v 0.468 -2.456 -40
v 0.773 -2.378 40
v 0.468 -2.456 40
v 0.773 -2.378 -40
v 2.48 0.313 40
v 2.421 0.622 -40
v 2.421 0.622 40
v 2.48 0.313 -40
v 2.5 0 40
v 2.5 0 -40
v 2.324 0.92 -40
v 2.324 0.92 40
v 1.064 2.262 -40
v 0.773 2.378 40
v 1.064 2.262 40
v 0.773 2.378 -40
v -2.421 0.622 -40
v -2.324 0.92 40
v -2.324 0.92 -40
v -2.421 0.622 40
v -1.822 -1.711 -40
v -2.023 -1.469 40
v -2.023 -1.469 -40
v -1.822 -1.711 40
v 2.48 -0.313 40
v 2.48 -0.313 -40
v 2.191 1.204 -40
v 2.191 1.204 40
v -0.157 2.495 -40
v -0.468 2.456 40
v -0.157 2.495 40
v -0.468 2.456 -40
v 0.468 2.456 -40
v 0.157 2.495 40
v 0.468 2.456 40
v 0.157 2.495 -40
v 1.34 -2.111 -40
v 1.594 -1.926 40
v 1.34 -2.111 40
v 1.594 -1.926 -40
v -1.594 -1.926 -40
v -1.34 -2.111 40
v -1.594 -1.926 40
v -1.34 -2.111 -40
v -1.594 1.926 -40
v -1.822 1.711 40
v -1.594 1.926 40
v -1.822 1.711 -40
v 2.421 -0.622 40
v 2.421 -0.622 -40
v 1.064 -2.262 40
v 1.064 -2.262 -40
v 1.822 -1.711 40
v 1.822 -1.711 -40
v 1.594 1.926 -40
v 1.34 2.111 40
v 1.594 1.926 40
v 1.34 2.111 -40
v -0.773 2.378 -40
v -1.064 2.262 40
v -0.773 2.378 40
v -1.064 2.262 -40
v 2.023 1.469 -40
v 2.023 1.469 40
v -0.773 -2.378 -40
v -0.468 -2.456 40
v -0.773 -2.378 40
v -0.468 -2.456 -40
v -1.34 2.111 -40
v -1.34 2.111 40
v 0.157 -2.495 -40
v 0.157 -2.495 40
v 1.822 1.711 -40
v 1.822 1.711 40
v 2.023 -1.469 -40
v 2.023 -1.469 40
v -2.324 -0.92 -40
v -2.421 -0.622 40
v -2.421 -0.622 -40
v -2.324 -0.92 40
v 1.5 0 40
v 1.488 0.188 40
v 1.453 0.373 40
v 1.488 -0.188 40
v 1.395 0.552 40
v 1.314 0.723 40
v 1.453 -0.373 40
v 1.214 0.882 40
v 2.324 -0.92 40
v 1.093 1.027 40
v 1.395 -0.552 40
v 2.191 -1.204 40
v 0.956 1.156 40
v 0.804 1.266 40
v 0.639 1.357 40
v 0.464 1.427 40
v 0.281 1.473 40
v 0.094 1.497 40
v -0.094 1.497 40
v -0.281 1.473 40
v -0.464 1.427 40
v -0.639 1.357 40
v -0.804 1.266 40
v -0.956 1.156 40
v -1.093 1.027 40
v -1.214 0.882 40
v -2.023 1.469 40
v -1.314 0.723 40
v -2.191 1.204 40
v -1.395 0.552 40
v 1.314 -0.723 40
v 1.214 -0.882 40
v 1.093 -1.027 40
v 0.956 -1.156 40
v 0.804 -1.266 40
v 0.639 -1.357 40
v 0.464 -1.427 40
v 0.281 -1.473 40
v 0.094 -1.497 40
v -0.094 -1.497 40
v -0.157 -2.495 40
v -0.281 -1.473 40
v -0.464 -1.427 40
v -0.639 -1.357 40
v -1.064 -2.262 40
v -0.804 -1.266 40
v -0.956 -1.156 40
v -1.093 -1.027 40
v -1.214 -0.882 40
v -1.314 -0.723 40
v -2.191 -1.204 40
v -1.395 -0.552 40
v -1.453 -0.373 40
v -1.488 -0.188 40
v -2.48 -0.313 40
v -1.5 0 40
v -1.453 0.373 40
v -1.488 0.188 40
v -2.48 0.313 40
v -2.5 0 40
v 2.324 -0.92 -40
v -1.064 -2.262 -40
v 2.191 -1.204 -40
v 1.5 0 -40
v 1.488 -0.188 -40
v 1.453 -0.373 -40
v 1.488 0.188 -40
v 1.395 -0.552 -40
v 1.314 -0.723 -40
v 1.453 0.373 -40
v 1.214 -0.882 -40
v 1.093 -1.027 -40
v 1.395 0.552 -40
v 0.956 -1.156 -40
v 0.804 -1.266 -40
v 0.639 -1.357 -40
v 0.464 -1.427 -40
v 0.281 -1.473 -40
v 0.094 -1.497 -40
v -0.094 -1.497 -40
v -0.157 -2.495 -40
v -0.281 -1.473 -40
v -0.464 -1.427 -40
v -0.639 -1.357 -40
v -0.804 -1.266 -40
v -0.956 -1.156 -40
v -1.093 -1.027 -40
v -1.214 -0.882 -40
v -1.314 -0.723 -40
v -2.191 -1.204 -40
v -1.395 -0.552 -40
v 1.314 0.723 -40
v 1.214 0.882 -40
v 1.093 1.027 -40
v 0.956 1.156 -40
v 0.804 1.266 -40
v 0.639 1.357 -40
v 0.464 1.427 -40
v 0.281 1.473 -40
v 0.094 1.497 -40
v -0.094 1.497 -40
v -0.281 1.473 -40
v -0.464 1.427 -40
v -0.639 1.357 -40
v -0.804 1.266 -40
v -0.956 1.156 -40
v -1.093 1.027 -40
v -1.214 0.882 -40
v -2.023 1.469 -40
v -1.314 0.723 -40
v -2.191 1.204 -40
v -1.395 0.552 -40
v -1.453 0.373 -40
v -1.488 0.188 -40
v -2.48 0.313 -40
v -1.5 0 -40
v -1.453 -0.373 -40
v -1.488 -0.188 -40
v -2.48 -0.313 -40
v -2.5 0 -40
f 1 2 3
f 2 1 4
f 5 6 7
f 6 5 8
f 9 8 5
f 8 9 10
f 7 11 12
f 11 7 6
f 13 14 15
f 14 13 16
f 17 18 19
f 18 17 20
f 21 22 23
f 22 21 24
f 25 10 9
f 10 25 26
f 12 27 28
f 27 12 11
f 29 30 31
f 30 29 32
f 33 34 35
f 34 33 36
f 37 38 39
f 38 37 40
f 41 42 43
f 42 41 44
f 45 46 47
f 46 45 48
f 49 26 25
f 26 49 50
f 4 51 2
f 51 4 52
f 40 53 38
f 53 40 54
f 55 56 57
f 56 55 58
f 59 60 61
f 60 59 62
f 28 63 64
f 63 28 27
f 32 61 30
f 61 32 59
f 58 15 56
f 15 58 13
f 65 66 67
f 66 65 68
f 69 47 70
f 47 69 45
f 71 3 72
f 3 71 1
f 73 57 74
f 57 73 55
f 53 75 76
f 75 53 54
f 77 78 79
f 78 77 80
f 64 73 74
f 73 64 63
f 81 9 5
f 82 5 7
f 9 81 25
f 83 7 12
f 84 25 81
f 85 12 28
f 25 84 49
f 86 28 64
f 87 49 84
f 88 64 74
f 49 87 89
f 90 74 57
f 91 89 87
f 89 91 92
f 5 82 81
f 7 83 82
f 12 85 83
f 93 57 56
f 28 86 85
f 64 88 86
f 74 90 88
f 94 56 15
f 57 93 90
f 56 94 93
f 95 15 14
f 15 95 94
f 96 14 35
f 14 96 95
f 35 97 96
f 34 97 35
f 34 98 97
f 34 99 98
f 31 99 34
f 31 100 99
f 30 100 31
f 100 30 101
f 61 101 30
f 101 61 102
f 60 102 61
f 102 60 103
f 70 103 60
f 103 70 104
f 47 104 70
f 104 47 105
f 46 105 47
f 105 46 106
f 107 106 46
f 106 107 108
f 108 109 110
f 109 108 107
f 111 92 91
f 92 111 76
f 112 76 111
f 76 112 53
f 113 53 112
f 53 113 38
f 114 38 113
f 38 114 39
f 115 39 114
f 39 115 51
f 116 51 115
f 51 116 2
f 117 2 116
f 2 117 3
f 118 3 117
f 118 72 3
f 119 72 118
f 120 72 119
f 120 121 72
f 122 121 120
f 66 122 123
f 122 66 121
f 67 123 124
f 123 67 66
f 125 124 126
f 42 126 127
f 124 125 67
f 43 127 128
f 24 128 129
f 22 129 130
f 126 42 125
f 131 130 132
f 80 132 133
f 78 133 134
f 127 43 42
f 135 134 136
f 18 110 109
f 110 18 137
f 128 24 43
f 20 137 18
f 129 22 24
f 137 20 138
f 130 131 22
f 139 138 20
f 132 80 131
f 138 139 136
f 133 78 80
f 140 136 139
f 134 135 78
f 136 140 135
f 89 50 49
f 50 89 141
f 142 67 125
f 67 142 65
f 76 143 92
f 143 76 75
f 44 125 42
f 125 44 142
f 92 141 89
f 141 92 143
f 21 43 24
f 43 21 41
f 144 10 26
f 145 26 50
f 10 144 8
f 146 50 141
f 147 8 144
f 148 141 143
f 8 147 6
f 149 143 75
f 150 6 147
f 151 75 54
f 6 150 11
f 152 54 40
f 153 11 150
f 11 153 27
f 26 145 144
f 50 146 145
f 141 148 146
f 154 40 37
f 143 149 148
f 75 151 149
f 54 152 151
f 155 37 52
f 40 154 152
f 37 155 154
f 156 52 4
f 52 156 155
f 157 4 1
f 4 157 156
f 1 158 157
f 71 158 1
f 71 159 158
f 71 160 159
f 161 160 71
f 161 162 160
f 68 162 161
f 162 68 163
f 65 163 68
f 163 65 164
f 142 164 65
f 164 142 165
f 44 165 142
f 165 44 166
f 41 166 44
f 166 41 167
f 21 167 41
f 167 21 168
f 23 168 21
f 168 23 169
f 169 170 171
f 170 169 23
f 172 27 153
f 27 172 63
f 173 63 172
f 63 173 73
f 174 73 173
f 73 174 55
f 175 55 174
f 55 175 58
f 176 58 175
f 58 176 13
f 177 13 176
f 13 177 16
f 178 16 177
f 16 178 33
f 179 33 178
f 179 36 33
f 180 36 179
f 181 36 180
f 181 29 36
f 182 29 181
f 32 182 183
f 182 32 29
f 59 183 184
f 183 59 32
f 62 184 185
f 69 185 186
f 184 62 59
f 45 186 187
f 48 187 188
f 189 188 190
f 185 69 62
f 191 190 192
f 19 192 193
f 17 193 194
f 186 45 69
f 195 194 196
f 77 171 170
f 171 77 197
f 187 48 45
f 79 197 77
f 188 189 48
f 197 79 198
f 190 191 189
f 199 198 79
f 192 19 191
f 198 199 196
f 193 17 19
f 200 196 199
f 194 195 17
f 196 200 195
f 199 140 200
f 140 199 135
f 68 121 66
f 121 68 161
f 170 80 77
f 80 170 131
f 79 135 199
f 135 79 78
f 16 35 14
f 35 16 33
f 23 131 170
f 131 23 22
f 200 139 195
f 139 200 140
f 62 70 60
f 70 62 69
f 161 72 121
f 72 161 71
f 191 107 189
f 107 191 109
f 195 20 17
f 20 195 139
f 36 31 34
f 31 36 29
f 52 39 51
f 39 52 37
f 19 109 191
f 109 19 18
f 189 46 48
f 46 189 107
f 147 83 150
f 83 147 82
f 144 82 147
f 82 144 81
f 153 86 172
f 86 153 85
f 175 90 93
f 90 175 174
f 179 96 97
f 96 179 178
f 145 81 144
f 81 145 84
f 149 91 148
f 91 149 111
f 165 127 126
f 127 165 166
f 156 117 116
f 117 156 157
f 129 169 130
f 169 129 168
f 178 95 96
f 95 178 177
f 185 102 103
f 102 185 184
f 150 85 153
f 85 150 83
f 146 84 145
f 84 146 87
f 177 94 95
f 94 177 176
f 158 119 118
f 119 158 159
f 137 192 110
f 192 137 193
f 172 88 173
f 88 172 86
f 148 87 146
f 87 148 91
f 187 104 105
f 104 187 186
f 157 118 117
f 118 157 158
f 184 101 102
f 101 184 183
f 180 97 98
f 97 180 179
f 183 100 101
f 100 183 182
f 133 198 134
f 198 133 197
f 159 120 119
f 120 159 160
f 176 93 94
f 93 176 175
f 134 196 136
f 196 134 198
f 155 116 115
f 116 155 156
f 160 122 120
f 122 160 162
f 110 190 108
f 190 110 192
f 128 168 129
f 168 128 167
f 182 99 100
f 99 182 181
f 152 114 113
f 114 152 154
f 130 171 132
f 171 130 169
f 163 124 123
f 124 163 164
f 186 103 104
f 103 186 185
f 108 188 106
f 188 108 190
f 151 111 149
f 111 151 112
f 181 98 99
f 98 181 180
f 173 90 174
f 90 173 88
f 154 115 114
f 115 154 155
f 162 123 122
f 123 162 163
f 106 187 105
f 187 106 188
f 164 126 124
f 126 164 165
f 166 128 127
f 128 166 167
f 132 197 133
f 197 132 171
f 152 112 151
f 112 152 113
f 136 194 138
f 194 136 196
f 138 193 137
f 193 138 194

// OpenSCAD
$fn = 50;


difference() {
	union() {
		translate(v = [0, 0, -40.0000000000]) {
			cylinder(h = 80, r = 2.5000000000);
		}
	}
	union() {
		translate(v = [0, 0, -100.0000000000]) {
			cylinder(h = 200, r = 1.5000000000);
		}
	}
}
